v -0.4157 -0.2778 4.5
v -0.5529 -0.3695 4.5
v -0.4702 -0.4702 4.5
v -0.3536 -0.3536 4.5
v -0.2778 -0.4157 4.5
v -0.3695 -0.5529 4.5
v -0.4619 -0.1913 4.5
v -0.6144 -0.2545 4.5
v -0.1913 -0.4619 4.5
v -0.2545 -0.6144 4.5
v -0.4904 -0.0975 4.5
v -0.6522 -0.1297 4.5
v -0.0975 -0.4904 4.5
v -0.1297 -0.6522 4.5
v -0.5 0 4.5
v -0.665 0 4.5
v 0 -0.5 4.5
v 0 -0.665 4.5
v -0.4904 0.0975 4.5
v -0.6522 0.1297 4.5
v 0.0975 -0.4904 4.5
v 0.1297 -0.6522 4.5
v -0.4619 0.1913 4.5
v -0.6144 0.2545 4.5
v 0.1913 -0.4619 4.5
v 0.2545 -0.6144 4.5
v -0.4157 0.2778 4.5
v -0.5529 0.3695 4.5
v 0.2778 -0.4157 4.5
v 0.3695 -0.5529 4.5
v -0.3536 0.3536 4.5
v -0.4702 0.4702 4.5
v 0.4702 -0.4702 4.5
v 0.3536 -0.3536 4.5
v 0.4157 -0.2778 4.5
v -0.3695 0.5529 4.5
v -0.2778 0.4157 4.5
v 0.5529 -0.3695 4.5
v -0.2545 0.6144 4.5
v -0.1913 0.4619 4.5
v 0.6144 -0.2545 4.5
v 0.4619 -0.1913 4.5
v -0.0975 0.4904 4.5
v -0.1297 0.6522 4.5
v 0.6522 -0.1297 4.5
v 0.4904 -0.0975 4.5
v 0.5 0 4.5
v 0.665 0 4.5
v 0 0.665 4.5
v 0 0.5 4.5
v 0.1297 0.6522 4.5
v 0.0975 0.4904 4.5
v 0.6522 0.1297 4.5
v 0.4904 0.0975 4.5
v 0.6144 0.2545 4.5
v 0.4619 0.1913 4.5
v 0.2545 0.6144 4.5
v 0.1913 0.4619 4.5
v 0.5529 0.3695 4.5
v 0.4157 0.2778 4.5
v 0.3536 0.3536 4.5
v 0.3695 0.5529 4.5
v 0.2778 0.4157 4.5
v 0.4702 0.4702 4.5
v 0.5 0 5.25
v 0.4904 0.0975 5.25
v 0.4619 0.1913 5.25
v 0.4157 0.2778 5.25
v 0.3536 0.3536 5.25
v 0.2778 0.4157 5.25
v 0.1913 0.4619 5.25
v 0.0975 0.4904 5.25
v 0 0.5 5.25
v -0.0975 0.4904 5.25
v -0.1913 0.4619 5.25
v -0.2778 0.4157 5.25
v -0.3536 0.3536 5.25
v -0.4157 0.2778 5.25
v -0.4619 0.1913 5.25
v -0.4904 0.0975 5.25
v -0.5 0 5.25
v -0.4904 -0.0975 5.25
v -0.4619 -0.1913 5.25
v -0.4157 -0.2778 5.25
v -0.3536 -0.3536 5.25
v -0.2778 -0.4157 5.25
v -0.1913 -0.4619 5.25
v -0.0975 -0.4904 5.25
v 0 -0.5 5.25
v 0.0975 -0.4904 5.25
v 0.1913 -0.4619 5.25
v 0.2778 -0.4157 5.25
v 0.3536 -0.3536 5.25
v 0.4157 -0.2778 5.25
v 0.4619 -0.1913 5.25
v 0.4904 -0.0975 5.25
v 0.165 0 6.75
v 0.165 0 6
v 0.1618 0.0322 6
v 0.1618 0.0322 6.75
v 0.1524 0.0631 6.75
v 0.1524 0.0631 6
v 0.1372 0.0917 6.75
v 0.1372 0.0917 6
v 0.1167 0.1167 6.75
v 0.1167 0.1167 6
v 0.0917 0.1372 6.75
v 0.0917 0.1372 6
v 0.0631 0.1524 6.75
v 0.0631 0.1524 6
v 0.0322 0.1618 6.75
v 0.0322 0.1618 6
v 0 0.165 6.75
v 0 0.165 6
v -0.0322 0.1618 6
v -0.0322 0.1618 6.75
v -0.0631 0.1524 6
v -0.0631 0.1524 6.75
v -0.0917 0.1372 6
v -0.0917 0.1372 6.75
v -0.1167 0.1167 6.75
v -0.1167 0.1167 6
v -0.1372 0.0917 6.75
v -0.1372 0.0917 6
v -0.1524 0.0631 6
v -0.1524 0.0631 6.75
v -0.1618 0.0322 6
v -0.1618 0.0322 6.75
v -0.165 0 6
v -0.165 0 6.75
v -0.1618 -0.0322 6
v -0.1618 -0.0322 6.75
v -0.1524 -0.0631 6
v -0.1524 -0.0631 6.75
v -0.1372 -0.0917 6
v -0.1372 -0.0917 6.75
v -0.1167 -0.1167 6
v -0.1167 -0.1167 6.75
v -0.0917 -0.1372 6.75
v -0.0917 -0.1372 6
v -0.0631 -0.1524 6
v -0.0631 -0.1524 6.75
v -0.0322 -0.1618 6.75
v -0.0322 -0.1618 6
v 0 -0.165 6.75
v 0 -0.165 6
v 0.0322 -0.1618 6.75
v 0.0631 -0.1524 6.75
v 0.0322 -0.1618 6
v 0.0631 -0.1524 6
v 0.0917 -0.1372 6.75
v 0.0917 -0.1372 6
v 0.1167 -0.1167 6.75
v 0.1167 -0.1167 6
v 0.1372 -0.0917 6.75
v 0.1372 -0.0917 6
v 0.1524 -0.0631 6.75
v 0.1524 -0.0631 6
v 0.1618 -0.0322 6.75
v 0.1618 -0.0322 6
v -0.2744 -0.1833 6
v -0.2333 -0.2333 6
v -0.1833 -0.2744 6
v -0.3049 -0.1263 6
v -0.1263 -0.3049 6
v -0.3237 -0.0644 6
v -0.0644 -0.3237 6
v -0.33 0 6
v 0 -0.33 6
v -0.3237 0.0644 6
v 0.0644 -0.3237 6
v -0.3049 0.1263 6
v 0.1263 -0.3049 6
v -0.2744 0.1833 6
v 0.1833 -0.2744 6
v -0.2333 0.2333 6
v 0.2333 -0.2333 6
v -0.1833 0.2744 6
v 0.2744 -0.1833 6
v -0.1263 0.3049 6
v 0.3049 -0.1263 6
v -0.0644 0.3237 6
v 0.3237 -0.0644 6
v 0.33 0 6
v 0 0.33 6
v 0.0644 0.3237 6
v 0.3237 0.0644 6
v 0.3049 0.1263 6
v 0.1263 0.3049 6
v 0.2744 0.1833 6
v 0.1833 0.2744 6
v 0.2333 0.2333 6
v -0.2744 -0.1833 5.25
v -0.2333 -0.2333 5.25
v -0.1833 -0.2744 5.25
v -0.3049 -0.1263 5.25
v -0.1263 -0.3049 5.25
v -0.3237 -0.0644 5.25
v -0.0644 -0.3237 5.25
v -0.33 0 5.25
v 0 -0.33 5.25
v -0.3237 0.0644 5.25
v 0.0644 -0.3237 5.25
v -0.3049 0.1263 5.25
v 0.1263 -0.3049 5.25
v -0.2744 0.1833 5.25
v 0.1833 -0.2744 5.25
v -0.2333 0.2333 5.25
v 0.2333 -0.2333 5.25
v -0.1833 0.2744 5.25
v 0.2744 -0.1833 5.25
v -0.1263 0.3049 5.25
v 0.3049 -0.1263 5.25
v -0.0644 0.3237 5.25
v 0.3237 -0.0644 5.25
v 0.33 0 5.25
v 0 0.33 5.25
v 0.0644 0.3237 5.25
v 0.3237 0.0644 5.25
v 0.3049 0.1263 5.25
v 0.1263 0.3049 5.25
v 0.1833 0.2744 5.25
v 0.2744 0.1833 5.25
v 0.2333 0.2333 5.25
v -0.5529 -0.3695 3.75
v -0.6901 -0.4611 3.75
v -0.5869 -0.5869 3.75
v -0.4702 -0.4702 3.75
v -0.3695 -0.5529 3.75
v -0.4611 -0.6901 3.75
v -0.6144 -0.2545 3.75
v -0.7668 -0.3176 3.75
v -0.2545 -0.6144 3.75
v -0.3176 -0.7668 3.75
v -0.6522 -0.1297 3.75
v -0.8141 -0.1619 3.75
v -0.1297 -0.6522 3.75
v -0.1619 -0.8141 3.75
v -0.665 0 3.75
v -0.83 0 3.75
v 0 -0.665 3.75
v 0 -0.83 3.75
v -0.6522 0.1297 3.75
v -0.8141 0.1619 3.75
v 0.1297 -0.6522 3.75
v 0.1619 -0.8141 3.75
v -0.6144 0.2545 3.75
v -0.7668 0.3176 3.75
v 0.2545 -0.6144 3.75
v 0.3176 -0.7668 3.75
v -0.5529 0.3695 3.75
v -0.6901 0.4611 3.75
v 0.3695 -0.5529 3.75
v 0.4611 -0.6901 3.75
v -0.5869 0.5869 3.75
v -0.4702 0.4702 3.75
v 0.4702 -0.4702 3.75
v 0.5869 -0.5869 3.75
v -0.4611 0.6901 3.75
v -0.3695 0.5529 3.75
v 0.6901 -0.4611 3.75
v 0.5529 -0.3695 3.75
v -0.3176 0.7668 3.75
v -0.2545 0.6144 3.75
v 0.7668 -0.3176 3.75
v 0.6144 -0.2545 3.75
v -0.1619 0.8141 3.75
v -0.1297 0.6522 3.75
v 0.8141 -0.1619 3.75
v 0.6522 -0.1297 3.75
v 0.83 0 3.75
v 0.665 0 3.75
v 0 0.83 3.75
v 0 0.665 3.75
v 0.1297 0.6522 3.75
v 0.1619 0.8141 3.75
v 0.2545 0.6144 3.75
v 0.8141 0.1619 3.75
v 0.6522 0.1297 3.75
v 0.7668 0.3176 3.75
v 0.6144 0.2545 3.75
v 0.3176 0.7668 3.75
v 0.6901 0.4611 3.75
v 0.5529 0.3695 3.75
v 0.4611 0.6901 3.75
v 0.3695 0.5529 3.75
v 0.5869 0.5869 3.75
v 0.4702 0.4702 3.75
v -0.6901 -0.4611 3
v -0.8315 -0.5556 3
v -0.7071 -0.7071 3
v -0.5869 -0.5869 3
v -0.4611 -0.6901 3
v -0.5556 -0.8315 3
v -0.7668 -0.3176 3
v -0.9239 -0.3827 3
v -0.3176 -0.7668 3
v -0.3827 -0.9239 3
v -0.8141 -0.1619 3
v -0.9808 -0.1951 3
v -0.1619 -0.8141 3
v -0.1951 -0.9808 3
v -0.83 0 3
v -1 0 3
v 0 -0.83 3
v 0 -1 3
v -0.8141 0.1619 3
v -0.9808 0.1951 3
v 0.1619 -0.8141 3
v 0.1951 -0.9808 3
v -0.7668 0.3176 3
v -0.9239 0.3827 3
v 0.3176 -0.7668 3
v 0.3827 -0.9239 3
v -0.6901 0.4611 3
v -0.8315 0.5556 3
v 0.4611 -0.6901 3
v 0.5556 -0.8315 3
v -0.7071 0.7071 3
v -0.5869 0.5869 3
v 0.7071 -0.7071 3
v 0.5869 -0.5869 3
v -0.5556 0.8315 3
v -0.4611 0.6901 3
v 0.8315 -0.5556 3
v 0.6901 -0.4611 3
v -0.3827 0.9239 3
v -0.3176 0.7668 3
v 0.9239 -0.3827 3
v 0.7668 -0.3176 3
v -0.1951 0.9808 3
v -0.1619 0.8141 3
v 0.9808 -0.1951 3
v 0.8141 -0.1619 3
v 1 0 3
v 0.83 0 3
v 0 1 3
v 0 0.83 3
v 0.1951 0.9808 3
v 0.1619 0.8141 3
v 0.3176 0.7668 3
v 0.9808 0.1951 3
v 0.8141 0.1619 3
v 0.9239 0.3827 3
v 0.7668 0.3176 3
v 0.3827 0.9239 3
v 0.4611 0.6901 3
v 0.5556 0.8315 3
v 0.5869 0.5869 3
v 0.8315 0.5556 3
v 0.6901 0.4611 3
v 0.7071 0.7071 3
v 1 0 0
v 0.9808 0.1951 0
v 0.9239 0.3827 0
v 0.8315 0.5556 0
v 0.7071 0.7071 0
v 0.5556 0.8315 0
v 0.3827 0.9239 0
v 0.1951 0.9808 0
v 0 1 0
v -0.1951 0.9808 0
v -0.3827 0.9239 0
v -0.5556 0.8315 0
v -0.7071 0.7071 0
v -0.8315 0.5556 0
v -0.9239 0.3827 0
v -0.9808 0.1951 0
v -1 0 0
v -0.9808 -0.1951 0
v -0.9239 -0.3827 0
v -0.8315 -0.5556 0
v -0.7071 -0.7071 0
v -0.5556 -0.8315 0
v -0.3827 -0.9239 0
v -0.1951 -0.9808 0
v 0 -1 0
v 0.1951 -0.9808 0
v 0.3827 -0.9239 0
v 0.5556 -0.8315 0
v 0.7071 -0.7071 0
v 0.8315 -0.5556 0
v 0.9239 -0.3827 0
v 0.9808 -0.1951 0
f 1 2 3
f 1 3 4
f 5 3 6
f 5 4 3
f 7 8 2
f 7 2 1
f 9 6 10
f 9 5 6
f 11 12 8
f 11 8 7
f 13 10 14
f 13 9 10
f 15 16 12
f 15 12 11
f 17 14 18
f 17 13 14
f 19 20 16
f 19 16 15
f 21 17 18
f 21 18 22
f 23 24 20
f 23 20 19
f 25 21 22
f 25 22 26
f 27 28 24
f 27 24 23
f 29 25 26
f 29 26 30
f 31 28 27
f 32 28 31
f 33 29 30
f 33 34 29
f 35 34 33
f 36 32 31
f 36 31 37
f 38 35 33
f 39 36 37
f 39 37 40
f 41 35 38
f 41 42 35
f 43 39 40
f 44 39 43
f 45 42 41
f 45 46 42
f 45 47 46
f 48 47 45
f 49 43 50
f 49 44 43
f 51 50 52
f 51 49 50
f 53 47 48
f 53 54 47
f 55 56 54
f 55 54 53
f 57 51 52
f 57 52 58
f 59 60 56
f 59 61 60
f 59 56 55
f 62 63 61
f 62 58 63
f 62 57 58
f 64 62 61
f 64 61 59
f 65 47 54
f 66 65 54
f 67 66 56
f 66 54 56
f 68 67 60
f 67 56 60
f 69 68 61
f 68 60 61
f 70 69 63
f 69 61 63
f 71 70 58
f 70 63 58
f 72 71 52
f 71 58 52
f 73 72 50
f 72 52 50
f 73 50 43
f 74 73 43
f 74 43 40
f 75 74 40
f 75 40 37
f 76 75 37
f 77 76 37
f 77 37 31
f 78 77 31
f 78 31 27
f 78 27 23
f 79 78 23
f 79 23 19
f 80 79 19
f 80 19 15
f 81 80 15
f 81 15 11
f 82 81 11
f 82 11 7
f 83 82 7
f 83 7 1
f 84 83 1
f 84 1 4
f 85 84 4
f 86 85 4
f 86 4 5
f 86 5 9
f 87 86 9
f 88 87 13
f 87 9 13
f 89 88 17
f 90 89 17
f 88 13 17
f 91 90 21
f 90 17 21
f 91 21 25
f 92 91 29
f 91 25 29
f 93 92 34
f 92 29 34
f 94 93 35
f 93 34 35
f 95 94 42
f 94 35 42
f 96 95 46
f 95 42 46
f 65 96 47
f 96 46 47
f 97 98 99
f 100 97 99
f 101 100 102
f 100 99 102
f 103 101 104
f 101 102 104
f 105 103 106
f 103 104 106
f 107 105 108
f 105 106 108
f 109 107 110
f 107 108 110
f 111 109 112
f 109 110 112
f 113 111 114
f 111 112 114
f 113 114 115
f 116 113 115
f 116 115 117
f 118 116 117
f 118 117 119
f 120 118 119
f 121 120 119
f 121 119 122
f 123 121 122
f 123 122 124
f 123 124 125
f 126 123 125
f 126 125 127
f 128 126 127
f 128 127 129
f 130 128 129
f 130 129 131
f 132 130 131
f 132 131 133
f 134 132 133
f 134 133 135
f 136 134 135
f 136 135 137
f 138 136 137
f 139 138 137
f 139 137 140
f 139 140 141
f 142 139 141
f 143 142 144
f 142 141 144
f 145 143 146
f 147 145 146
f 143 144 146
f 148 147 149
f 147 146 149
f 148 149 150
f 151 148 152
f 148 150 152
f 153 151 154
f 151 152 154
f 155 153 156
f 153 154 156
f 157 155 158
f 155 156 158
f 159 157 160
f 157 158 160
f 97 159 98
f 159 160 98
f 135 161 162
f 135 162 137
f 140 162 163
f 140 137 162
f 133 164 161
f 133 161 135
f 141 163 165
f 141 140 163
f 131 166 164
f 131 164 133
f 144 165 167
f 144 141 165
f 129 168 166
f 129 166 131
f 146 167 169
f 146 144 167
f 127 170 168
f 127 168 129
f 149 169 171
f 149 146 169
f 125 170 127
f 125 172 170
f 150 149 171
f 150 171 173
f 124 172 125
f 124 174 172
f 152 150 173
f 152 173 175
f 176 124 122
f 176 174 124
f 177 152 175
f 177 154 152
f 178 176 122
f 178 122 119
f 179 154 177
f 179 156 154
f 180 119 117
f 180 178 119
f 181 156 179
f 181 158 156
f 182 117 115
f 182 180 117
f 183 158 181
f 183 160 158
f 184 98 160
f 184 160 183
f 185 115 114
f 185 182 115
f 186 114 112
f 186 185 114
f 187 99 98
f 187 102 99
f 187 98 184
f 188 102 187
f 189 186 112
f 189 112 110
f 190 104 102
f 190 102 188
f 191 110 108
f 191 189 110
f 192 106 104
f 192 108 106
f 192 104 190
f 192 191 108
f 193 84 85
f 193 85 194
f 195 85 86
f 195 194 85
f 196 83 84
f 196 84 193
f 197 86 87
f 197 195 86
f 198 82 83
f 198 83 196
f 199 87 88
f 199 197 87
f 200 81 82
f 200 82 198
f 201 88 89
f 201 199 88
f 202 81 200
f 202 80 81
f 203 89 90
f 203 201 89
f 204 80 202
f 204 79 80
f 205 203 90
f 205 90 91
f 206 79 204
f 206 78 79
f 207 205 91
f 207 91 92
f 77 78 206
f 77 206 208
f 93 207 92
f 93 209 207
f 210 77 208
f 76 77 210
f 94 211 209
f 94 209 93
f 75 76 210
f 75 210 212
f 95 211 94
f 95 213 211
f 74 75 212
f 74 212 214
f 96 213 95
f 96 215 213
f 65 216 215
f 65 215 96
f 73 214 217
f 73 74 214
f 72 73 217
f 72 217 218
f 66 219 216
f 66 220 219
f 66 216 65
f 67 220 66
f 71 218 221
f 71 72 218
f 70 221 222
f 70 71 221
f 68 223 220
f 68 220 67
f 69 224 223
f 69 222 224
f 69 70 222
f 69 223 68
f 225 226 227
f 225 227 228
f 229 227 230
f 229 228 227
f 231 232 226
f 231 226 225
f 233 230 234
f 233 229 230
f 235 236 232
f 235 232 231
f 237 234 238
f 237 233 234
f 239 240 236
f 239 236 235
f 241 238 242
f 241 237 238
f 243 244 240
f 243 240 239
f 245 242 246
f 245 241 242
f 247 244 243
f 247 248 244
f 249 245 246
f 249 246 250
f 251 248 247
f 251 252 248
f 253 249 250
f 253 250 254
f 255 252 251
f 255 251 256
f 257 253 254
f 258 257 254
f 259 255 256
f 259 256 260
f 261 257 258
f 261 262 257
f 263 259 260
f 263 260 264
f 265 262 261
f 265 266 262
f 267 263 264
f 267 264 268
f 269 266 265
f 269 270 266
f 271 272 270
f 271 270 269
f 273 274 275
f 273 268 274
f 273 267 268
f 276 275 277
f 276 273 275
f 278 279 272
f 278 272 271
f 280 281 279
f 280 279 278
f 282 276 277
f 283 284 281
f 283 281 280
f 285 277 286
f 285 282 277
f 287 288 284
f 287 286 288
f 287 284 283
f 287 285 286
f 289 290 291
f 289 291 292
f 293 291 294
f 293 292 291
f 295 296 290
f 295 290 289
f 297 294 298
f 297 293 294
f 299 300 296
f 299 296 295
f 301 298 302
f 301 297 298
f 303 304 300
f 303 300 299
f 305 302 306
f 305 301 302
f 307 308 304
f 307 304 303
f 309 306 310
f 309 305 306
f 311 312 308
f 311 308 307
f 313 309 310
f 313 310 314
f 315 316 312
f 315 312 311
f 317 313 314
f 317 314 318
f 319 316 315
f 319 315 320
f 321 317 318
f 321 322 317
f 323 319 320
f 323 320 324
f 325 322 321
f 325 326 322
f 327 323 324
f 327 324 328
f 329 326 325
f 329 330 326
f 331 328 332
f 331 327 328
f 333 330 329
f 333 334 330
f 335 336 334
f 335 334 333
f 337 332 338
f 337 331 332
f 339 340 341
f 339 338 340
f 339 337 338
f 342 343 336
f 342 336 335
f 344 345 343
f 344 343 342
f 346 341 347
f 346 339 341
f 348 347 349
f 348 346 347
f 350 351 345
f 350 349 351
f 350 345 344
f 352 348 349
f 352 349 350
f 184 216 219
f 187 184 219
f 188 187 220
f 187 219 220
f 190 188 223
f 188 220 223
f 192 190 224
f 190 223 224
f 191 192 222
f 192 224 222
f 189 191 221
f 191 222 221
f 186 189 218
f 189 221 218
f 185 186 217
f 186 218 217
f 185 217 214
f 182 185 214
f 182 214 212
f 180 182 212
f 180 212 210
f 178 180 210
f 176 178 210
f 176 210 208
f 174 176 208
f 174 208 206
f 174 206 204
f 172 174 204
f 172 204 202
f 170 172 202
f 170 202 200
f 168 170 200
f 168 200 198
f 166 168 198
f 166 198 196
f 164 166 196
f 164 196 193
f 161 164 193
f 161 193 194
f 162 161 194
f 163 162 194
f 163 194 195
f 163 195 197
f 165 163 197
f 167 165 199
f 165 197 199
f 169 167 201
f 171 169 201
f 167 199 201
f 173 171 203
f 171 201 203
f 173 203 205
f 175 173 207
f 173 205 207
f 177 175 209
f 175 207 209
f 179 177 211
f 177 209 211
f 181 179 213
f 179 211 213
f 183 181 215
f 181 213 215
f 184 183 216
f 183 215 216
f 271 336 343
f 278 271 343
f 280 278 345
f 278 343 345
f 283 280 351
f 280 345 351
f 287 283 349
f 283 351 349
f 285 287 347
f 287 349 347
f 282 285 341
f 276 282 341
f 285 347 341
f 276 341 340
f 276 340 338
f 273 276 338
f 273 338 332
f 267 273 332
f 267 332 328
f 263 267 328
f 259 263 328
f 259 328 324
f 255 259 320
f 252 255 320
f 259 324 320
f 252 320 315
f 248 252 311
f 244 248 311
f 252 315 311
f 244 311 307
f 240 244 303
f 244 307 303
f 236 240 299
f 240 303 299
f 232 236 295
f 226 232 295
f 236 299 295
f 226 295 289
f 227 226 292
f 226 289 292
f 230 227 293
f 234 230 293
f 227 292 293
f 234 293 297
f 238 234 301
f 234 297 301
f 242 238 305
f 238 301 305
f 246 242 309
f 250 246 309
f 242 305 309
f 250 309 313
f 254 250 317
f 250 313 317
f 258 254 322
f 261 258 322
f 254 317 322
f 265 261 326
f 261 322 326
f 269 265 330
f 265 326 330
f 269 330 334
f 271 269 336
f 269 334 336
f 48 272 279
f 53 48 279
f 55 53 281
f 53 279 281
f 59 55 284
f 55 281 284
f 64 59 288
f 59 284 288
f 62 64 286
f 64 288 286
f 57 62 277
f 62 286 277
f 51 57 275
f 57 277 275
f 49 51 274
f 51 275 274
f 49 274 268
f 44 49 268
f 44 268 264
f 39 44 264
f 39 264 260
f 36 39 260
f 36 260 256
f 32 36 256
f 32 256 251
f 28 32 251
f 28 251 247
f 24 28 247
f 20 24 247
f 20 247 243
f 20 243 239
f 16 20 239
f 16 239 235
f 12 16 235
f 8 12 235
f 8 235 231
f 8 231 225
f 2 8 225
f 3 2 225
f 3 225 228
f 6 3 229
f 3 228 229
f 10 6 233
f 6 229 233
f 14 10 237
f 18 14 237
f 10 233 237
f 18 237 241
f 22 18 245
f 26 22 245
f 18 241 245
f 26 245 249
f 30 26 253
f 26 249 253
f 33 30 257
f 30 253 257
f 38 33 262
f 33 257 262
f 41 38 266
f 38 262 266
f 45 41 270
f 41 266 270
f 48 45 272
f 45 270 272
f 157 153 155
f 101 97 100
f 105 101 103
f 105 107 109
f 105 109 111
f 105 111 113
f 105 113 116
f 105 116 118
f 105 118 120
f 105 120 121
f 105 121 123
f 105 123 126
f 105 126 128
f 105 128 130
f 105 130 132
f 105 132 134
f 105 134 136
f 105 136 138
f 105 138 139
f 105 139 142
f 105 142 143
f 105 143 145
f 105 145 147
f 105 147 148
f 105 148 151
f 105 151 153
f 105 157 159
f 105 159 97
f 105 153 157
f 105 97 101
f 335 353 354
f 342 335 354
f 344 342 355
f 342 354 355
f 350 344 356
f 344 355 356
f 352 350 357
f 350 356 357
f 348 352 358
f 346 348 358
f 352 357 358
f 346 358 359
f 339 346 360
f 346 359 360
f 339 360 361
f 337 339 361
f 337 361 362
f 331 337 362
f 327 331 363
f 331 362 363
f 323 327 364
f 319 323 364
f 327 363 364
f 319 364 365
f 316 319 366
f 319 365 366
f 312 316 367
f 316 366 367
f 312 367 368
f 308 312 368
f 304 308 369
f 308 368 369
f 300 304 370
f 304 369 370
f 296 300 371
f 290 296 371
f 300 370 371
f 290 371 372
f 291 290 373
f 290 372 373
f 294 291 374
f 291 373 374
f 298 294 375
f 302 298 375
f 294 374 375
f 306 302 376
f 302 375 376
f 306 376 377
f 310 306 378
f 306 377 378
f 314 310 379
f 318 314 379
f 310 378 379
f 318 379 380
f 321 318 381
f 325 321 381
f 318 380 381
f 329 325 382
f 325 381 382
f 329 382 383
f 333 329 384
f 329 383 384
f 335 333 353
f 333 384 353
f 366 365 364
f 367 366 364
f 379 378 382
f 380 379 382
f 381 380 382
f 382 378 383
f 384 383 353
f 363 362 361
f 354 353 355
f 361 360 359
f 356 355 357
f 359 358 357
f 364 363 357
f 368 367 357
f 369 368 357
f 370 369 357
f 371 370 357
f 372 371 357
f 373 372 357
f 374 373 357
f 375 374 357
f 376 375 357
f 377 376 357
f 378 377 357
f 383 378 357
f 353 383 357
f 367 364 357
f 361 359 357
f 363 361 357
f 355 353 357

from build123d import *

# Parameters (mm, degrees)
SKETCH1_R           = 1
BOSS_EXTRUDE1_DEPTH = 3
SKETCH2_R           = 0.33
SKETCH2_R_2         = 0.165
BOSS_EXTRUDE2_DEPTH = 3
SKETCH2_3_R         = 0.5
SKETCH2_3_R_2       = 0.33
BOSS_EXTRUDE3_DEPTH = 2.25
SKETCH2_4_R         = 0.665
SKETCH2_4_R_2       = 0.5
BOSS_EXTRUDE4_DEPTH = 1.5
SKETCH2_6_R         = 0.83
SKETCH2_6_R_2       = 0.665
BOSS_EXTRUDE6_DEPTH = 0.75
SKETCH2_7_R         = 0.165
BOSS_EXTRUDE7_DEPTH = 3.75


with BuildPart() as part:
    # Sketch1 → Boss-Extrude1 (new body)
    with BuildSketch(Plane.XY):
        Circle(SKETCH1_R)
    extrude(amount=BOSS_EXTRUDE1_DEPTH)

    # Sketch2 → Boss-Extrude2 (add)
    with BuildSketch(Plane.XY.offset(3)):
        Circle(SKETCH2_R)
        Circle(SKETCH2_R_2, mode=Mode.SUBTRACT)
    extrude(amount=BOSS_EXTRUDE2_DEPTH)

    # Sketch2<3> → Boss-Extrude3 (add)
    with BuildSketch(Plane.XY.offset(3)):
        Circle(SKETCH2_3_R)
        Circle(SKETCH2_3_R_2, mode=Mode.SUBTRACT)
    extrude(amount=BOSS_EXTRUDE3_DEPTH)

    # Sketch2<4> → Boss-Extrude4 (add)
    with BuildSketch(Plane.XY.offset(3)):
        Circle(SKETCH2_4_R)
        Circle(SKETCH2_4_R_2, mode=Mode.SUBTRACT)
    extrude(amount=BOSS_EXTRUDE4_DEPTH)

    # Sketch2<6> → Boss-Extrude6 (add)
    with BuildSketch(Plane.XY.offset(3)):
        Circle(SKETCH2_6_R)
        Circle(SKETCH2_6_R_2, mode=Mode.SUBTRACT)
    extrude(amount=BOSS_EXTRUDE6_DEPTH)

    # Sketch2<7> → Boss-Extrude7 (add)
    with BuildSketch(Plane.XY.offset(3)):
        Circle(SKETCH2_7_R)
    extrude(amount=BOSS_EXTRUDE7_DEPTH)


solid = part.part
